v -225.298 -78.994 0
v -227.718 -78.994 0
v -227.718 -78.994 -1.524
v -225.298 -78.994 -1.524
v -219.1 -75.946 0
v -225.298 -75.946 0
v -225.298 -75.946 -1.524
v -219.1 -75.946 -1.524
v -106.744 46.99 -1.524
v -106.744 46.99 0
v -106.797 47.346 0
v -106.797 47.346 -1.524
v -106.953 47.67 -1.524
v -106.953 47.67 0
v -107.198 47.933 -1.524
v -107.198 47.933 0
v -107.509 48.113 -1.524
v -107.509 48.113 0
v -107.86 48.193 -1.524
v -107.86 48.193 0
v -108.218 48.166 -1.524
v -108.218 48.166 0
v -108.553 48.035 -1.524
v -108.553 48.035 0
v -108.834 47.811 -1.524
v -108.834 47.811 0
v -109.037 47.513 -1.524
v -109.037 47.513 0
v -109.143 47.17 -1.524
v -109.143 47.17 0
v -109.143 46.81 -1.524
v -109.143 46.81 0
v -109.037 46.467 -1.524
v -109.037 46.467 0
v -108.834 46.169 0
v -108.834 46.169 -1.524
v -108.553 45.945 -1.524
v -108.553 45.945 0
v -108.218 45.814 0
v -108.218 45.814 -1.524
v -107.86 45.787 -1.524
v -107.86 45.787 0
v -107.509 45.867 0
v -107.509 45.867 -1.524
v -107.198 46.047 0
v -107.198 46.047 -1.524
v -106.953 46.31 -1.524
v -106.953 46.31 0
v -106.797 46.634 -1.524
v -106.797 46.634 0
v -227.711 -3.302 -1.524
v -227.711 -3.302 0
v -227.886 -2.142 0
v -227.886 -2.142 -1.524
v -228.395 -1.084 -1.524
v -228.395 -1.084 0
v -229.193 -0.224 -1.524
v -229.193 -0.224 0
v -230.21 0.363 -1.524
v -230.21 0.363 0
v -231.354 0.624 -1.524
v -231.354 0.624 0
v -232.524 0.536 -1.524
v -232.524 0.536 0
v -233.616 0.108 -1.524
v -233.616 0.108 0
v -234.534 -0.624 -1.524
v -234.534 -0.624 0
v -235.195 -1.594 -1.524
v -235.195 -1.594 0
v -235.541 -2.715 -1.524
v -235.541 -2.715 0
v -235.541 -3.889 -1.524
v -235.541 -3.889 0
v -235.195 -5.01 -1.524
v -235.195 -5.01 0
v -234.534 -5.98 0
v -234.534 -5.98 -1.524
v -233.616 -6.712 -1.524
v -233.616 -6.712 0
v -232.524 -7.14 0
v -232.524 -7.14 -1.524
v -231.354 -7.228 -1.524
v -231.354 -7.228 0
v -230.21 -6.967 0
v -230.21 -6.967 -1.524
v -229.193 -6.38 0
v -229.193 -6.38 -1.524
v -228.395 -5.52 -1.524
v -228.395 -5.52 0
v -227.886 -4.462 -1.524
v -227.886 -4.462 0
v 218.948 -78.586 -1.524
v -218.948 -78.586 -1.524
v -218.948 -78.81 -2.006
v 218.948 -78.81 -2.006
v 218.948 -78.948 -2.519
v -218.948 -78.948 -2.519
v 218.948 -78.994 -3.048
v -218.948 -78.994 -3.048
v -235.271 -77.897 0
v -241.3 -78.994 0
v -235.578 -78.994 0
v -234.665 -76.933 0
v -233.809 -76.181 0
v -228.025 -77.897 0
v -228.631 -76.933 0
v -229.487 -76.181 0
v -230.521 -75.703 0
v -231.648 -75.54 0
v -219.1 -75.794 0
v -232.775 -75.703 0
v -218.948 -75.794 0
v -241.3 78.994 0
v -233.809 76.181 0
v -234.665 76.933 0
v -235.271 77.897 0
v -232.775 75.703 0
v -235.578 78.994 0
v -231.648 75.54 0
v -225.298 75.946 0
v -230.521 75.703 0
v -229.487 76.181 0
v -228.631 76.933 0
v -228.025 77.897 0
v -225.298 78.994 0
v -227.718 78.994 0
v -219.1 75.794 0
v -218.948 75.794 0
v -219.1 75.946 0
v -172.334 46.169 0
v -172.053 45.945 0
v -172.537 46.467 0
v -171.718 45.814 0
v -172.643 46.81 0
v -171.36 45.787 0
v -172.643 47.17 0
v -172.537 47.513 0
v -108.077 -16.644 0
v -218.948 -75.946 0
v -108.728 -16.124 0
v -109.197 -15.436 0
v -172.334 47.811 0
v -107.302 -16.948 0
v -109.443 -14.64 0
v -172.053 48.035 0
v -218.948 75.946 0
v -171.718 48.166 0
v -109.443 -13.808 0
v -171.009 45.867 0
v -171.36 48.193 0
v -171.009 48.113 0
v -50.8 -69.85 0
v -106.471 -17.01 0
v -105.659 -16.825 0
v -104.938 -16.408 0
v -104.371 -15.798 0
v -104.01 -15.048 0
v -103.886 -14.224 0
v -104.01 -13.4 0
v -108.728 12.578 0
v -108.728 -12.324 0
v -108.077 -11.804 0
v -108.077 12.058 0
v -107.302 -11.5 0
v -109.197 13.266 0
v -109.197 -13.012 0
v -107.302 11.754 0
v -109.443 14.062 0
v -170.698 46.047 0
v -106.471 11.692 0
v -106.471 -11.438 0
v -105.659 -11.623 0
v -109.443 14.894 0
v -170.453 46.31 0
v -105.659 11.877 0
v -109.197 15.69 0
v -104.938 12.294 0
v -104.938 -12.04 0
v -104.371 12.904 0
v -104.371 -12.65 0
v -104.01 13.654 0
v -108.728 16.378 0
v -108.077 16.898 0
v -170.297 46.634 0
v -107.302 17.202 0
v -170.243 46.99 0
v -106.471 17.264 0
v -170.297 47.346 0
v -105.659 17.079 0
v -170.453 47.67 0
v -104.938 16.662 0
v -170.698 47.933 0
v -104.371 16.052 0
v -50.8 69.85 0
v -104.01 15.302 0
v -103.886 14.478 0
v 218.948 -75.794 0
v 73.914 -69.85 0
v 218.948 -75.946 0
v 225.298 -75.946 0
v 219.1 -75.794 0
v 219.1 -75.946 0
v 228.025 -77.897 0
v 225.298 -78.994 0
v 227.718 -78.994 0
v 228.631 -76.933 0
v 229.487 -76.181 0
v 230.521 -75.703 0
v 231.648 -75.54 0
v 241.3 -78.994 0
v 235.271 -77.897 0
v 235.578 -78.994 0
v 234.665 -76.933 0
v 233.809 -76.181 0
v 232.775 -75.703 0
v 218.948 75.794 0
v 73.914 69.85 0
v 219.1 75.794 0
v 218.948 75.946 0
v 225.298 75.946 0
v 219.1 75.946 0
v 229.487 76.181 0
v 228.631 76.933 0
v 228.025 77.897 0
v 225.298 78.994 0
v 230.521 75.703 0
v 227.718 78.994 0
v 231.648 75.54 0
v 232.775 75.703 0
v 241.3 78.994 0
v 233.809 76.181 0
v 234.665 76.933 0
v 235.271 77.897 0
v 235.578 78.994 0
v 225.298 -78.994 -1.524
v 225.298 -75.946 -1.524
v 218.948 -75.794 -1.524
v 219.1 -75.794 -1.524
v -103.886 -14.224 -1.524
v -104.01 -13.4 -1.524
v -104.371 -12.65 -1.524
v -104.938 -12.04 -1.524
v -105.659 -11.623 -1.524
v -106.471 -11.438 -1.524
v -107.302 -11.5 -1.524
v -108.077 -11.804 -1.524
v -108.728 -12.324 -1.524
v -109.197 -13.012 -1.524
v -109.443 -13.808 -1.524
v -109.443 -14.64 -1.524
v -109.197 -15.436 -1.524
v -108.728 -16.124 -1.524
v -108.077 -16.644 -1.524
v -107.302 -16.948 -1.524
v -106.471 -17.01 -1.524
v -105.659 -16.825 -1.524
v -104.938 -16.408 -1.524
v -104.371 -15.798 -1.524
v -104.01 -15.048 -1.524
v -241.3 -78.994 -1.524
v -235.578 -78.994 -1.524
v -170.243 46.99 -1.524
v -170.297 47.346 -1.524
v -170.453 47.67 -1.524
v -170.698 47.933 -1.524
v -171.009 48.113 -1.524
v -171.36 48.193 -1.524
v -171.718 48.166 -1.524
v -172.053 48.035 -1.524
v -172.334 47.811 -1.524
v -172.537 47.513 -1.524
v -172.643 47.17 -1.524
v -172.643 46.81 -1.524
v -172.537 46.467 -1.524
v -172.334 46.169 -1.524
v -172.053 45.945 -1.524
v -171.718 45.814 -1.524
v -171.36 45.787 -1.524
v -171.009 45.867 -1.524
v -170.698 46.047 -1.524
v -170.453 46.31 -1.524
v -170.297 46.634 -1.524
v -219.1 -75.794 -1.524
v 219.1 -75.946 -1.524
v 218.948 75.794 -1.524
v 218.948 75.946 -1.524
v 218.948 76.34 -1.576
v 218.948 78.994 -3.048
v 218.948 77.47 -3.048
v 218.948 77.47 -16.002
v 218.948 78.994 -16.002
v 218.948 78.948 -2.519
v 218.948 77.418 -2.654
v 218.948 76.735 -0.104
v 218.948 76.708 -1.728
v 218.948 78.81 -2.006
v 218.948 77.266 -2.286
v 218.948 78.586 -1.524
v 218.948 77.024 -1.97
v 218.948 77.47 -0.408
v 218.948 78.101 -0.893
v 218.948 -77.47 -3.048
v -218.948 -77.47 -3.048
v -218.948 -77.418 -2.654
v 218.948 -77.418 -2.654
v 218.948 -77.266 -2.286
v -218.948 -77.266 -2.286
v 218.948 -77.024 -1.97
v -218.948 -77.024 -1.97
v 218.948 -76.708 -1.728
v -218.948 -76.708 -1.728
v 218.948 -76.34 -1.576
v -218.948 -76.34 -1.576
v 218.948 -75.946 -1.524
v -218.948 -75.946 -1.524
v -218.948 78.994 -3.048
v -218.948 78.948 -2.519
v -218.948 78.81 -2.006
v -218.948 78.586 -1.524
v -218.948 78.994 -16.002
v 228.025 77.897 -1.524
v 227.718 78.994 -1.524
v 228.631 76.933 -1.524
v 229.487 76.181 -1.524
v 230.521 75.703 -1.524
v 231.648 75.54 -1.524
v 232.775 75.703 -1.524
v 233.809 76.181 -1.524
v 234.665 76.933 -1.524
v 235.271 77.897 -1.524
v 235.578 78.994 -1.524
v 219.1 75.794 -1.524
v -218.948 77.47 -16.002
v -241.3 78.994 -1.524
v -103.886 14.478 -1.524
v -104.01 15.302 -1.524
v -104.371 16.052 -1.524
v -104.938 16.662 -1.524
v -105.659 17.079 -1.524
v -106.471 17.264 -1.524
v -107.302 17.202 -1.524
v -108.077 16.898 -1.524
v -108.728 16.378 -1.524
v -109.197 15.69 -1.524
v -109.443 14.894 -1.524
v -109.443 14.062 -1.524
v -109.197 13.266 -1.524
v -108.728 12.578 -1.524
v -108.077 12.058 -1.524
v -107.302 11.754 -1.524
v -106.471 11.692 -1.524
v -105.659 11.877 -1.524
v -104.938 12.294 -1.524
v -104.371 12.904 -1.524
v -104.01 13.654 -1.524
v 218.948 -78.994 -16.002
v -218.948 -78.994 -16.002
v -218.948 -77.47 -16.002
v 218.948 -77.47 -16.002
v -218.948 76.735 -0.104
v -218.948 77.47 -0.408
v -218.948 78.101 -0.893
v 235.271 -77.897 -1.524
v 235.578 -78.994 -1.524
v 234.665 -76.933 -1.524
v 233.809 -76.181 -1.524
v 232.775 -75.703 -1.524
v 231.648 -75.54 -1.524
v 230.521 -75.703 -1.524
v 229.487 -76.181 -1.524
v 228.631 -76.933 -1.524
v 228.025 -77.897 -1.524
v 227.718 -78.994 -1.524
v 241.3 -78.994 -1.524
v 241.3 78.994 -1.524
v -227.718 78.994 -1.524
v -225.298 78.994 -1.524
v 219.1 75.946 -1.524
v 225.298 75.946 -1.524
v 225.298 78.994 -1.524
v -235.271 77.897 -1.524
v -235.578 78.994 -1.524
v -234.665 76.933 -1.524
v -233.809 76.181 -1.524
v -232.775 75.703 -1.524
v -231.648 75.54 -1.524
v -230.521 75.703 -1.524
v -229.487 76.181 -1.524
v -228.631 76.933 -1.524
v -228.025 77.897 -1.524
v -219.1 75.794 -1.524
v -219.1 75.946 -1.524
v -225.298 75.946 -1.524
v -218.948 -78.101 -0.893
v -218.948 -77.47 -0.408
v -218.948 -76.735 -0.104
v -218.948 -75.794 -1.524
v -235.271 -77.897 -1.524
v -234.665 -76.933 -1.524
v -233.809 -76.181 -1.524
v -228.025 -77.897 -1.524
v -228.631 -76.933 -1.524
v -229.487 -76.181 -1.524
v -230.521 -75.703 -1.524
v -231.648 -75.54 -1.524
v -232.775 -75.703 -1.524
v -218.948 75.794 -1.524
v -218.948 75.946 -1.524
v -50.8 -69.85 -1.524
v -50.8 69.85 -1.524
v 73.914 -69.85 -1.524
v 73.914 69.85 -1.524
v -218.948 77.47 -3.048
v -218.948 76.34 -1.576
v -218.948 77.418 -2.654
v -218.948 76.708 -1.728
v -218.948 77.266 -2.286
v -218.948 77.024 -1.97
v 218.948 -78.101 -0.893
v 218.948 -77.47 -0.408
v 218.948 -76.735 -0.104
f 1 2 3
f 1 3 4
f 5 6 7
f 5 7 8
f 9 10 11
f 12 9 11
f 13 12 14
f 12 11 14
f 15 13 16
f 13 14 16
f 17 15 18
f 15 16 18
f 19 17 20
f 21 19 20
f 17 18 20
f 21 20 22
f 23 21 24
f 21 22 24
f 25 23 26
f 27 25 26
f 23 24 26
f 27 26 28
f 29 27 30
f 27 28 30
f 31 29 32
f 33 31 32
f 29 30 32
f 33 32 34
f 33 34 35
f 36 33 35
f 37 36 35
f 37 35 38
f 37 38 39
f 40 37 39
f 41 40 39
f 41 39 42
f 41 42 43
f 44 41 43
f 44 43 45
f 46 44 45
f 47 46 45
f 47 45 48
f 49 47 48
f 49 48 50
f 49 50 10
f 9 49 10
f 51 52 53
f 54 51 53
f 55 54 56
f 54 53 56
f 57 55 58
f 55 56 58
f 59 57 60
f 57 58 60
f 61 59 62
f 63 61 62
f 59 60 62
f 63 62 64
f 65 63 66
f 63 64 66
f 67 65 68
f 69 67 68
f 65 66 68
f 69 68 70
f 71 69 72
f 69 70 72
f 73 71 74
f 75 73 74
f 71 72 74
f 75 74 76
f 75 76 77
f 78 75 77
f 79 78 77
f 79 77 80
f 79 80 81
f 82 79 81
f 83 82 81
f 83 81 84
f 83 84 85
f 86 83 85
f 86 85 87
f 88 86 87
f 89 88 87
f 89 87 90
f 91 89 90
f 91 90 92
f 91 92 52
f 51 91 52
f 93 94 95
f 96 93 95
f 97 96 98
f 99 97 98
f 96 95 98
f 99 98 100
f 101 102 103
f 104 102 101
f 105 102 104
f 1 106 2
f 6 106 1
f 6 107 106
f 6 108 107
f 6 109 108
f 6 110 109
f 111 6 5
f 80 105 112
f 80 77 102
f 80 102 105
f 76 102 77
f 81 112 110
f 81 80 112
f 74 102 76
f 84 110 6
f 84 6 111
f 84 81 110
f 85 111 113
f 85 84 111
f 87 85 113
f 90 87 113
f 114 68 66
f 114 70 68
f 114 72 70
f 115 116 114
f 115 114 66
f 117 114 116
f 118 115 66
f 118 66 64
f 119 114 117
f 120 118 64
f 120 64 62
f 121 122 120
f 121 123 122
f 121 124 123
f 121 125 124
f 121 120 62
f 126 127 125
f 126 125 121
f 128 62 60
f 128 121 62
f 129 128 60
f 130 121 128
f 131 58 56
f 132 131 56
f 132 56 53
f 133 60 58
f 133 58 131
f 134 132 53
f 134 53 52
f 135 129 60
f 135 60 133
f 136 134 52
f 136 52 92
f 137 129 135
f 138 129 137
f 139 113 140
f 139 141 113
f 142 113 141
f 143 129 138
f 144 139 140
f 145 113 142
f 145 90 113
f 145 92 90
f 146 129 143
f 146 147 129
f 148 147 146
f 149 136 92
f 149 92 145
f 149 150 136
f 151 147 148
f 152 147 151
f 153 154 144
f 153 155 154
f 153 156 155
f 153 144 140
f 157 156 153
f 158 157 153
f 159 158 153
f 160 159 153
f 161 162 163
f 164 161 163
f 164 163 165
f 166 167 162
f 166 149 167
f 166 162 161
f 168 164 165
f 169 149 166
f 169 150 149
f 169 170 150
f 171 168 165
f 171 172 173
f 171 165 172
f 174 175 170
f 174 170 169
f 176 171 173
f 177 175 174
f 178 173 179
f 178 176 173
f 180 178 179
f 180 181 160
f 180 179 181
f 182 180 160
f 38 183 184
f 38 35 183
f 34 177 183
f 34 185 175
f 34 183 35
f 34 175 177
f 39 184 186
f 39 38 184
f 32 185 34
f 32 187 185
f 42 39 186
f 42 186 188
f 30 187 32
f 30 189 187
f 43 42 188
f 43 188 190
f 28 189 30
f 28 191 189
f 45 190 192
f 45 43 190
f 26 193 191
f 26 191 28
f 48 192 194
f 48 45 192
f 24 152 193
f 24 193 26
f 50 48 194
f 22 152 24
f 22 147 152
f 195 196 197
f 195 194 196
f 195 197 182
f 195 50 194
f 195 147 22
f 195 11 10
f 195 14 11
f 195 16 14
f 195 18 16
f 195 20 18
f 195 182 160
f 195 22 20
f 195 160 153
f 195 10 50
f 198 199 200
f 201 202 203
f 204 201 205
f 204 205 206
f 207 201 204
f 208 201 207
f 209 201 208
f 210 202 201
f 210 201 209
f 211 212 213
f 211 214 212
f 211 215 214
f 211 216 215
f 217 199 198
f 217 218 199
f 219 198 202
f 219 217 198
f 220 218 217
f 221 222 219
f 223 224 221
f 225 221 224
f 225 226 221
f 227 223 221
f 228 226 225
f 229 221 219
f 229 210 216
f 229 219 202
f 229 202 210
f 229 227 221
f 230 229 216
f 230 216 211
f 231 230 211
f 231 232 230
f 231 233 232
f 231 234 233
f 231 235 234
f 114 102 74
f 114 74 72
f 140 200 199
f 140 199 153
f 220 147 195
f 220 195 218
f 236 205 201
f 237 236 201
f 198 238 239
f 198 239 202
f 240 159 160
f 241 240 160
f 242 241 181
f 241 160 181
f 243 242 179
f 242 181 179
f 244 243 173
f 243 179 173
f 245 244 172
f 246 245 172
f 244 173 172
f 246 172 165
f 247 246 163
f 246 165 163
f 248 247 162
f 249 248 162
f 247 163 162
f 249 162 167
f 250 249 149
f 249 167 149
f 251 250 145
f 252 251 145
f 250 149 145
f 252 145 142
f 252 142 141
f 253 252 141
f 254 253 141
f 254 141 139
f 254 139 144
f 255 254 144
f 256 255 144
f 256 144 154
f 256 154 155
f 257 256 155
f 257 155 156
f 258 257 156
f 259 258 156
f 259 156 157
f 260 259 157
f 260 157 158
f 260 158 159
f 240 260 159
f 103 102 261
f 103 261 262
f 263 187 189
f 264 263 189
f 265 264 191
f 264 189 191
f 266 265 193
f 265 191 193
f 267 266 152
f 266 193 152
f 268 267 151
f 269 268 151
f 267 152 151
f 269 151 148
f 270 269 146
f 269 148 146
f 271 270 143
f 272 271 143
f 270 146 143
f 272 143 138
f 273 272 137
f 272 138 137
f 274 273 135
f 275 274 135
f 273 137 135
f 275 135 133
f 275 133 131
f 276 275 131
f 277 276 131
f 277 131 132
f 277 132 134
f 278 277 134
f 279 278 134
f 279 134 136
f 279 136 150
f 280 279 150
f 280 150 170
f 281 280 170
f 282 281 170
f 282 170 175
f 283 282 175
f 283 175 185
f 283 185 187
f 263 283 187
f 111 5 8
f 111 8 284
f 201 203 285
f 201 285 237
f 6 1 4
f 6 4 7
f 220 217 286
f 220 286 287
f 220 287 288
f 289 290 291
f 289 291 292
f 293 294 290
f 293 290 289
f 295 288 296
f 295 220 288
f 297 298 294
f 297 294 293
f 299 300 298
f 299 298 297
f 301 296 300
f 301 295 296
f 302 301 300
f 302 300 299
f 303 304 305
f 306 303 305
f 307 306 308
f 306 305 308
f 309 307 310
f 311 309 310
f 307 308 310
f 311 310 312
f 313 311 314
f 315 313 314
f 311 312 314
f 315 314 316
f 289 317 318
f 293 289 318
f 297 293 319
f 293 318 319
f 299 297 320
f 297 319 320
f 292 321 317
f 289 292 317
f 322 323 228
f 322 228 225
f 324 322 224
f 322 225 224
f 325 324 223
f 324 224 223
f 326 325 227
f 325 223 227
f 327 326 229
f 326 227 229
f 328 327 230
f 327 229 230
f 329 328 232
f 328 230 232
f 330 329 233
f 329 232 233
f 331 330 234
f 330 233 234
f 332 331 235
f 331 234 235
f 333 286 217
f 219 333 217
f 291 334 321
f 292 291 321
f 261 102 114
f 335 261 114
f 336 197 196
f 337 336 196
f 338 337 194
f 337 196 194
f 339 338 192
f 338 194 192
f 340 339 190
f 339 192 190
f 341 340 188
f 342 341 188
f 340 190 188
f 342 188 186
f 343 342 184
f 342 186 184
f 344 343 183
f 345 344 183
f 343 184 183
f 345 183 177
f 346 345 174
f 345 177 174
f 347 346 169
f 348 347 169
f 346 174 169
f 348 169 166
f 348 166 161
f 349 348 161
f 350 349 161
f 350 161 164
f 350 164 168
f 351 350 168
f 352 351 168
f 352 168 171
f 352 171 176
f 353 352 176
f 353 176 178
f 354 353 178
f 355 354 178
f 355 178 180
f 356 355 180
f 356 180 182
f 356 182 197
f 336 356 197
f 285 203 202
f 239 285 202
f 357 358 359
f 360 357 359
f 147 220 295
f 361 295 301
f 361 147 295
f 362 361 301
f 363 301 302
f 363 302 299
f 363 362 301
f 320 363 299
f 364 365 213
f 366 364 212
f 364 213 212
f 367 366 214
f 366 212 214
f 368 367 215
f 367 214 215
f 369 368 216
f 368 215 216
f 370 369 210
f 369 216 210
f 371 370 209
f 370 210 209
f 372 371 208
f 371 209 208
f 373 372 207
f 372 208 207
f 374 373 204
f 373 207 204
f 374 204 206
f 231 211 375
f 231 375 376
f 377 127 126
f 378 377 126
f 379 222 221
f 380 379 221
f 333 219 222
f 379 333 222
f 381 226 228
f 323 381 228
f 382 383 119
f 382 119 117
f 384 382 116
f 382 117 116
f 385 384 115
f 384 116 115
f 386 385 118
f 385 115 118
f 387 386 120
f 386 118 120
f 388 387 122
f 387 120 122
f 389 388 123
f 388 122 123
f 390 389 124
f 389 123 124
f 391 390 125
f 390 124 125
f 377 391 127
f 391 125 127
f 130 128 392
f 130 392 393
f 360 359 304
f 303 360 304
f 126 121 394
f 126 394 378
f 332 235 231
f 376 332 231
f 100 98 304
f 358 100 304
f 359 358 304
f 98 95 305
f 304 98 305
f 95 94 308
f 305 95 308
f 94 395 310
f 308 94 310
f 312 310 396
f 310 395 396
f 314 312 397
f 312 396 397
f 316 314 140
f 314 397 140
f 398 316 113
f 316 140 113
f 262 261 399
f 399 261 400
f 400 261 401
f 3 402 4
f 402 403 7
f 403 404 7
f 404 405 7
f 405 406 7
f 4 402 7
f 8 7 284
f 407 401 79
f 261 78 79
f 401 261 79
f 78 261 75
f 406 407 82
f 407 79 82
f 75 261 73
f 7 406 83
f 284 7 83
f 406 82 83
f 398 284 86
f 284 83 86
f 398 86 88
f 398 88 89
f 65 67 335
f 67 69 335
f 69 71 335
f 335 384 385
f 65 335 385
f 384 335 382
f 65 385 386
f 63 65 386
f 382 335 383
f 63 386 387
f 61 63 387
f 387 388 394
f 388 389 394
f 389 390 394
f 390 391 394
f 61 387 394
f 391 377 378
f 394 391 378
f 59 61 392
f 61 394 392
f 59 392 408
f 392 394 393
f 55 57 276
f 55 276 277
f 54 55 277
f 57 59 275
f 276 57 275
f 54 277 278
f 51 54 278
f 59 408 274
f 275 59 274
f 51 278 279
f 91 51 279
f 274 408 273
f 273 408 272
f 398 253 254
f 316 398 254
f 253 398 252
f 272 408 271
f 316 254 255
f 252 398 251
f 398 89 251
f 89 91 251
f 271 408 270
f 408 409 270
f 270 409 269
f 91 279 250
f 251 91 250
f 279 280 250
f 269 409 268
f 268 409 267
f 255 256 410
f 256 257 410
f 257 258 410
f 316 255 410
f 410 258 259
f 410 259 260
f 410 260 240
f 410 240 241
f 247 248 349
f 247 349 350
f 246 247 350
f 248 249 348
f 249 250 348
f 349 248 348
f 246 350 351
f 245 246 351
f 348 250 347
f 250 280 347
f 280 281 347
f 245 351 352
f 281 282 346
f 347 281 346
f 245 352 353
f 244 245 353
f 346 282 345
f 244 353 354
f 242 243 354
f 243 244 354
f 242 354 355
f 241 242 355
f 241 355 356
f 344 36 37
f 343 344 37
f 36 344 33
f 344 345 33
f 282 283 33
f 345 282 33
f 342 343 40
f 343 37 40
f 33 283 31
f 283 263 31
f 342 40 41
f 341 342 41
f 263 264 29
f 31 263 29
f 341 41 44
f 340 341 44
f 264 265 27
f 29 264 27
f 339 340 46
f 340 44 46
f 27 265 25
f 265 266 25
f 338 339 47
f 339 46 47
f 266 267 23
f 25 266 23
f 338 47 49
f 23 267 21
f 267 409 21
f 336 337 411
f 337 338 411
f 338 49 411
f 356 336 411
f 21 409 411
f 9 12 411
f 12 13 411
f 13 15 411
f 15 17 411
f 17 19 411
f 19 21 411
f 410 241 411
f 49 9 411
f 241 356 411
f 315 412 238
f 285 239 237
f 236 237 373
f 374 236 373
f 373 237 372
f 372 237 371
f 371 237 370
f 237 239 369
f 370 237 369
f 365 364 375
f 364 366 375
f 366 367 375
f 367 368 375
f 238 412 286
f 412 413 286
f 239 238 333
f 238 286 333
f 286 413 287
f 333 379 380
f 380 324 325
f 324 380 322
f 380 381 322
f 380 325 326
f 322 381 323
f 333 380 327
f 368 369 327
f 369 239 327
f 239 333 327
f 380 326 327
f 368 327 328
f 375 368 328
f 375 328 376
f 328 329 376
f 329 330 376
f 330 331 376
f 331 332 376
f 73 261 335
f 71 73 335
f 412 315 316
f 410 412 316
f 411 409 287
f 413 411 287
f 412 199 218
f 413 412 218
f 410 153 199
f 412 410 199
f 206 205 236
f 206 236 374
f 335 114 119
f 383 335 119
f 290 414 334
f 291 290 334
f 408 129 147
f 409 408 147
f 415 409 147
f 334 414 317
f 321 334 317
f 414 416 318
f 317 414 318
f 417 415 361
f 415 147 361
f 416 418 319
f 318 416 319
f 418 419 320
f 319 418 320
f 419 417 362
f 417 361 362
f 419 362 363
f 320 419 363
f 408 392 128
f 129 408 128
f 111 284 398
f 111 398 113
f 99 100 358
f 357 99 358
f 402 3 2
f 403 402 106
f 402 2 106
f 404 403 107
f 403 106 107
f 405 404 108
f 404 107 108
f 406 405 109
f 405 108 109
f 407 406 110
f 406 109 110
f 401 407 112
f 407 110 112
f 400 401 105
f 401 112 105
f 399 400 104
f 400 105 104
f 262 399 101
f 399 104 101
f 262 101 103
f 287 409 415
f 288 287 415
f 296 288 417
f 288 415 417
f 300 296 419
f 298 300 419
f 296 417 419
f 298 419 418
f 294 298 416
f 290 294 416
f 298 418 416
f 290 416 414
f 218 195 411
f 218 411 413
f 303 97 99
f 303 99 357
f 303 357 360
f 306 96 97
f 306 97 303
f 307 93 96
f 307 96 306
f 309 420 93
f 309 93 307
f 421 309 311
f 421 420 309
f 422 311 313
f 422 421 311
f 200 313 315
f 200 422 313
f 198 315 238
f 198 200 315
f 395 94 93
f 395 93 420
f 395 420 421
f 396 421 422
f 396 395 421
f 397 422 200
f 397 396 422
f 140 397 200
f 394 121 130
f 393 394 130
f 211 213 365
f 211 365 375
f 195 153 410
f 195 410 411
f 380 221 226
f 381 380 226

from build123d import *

# Parameters (mm, degrees)
CROQUIS1_W                   = 482.6
CROQUIS1_H                   = 157.988
BRIDA_BASE1_DEPTH            = 1.524
CROQUIS6_R                   = 3.9624
CROQUIS6_W                   = 6.35
CROQUIS6_H                   = 3.048
CORTAR_EXTRUIR1_DEPTH        = 254.905621466
BRIDA_START                  = -218.948
BRIDA_DE_ARISTA1_DEPTH       = 437.896
BRIDA_START_2                = -219.1004
BRIDA_DE_ARISTA1_2_OUTLINE_W = 0.1524
BRIDA_DE_ARISTA1_2_OUTLINE_H = 1.524
BRIDA_DE_ARISTA1_2_DEPTH     = 0.1524
BRIDA_START_3                = 218.948
BRIDA_DE_ARISTA1_3_OUTLINE_W = 0.1524
BRIDA_DE_ARISTA1_3_OUTLINE_H = 1.524
BRIDA_DE_ARISTA1_3_DEPTH     = 0.1524
BRIDA_DE_ARISTA1_4_DEPTH     = 437.896
CROQUIS13_R                  = 2.794
CROQUIS13_R_2                = 1.2065
CROQUIS13_R_3                = 3.937
CROQUIS13_W                  = 124.714
CROQUIS13_H                  = 139.7
CORTAR_EXTRUIR2_DEPTH        = 27.178


# Read off the part's stored shape, not the designer's step: Brida de arista1
# Sheet-metal steps are written as plain solids
with BuildPart() as part:
    # Croquis1 → Brida base1 (new body)
    with BuildSketch(Plane.XY):
        Rectangle(CROQUIS1_W, CROQUIS1_H)
    extrude(amount=-BRIDA_BASE1_DEPTH)

    # Croquis6 → Cortar-Extruir1 (cut, through all)
    with BuildSketch(Plane.XY):
        with Locations((231.648, 79.502)):
            Circle(CROQUIS6_R)
        with Locations((-231.648, 79.502)):
            Circle(CROQUIS6_R)
        with Locations((-231.648, -79.502)):
            Circle(CROQUIS6_R)
        with Locations((231.648, -79.502)):
            Circle(CROQUIS6_R)
        with Locations((-222.123, 77.47)):
            Rectangle(CROQUIS6_W, CROQUIS6_H)
        with Locations((222.123, 77.47)):
            Rectangle(CROQUIS6_W, CROQUIS6_H)
        with Locations((-222.123, -77.47)):
            Rectangle(CROQUIS6_W, CROQUIS6_H)
        with Locations((222.123, -77.47)):
            Rectangle(CROQUIS6_W, CROQUIS6_H)
    extrude(amount=-CORTAR_EXTRUIR1_DEPTH, mode=Mode.SUBTRACT)

    # Brida de arista1 outline → Brida de arista1 (cut)
    with BuildSketch(Plane.YZ.offset(BRIDA_START)):
        with BuildLine():
            ThreePointArc((-78.585645431, -1.524), (-77.47, -0.408354569), (-75.946, 0))
            Line((-75.946, 0), (-78.994, 0))
            Line((-78.994, 0), (-78.994, -1.524))
            Line((-78.994, -1.524), (-78.585645431, -1.524))
        make_face()
        with BuildLine():
            Line((78.994, 0), (75.946, 0))
            ThreePointArc((75.946, 0), (77.47, -0.408354569), (78.585645431, -1.524))
            Line((78.585645431, -1.524), (78.994, -1.524))
            Line((78.994, -1.524), (78.994, 0))
        make_face()
    extrude(amount=BRIDA_DE_ARISTA1_DEPTH, mode=Mode.SUBTRACT)

    # Brida de arista1 2 outline → Brida de arista1 2 (cut)
    with BuildSketch(Plane.YZ.offset(BRIDA_START_2)):
        with Locations((-75.8698, -0.762)):
            Rectangle(BRIDA_DE_ARISTA1_2_OUTLINE_W, BRIDA_DE_ARISTA1_2_OUTLINE_H)
        with Locations((75.8698, -0.762)):
            Rectangle(BRIDA_DE_ARISTA1_2_OUTLINE_W, BRIDA_DE_ARISTA1_2_OUTLINE_H)
    extrude(amount=BRIDA_DE_ARISTA1_2_DEPTH, mode=Mode.SUBTRACT)

    # Brida de arista1 3 outline → Brida de arista1 3 (cut)
    with BuildSketch(Plane.YZ.offset(BRIDA_START_3)):
        with Locations((-75.8698, -0.762)):
            Rectangle(BRIDA_DE_ARISTA1_3_OUTLINE_W, BRIDA_DE_ARISTA1_3_OUTLINE_H)
        with Locations((75.8698, -0.762)):
            Rectangle(BRIDA_DE_ARISTA1_3_OUTLINE_W, BRIDA_DE_ARISTA1_3_OUTLINE_H)
    extrude(amount=BRIDA_DE_ARISTA1_3_DEPTH, mode=Mode.SUBTRACT)

    # Brida de arista1 4 outline → Brida de arista1 4 (add)
    with BuildSketch(Plane.YZ.offset(BRIDA_START)):
        with BuildLine():
            ThreePointArc((-77.47, -3.048), (-77.023630735, -1.970369265), (-75.946, -1.524))
            Line((-75.946, -1.524), (-78.585645431, -1.524))
            ThreePointArc((-78.585645431, -1.524), (-78.890141918, -2.259119551), (-78.994, -3.048))
            Line((-78.994, -3.048), (-78.994, -16.002))
            Line((-78.994, -16.002), (-77.47, -16.002))
            Line((-77.47, -16.002), (-77.47, -3.048))
        make_face()
        with BuildLine():
            Line((78.585645431, -1.524), (75.946, -1.524))
            ThreePointArc((75.946, -1.524), (77.023630735, -1.970369265), (77.47, -3.048))
            Line((77.47, -3.048), (77.47, -16.002))
            Line((77.47, -16.002), (78.994, -16.002))
            Line((78.994, -16.002), (78.994, -3.048))
            ThreePointArc((78.994, -3.048), (78.890141918, -2.259119551), (78.585645431, -1.524))
        make_face()
    extrude(amount=BRIDA_DE_ARISTA1_4_DEPTH)

    # Croquis13 → Cortar-Extruir2 (cut)
    with BuildSketch(Plane.XY):
        with Locations((-106.68, 14.478)):
            Circle(CROQUIS13_R)
        with Locations((-106.68, -14.224)):
            Circle(CROQUIS13_R)
        with Locations((-107.95, 46.99)):
            Circle(CROQUIS13_R_2)
        with Locations((-171.45, 46.99)):
            Circle(CROQUIS13_R_2)
        with Locations((-231.648, -3.302)):
            Circle(CROQUIS13_R_3)
        with Locations((11.557, 0)):
            Rectangle(CROQUIS13_W, CROQUIS13_H)
    extrude(amount=-CORTAR_EXTRUIR2_DEPTH, mode=Mode.SUBTRACT)


solid = part.part
